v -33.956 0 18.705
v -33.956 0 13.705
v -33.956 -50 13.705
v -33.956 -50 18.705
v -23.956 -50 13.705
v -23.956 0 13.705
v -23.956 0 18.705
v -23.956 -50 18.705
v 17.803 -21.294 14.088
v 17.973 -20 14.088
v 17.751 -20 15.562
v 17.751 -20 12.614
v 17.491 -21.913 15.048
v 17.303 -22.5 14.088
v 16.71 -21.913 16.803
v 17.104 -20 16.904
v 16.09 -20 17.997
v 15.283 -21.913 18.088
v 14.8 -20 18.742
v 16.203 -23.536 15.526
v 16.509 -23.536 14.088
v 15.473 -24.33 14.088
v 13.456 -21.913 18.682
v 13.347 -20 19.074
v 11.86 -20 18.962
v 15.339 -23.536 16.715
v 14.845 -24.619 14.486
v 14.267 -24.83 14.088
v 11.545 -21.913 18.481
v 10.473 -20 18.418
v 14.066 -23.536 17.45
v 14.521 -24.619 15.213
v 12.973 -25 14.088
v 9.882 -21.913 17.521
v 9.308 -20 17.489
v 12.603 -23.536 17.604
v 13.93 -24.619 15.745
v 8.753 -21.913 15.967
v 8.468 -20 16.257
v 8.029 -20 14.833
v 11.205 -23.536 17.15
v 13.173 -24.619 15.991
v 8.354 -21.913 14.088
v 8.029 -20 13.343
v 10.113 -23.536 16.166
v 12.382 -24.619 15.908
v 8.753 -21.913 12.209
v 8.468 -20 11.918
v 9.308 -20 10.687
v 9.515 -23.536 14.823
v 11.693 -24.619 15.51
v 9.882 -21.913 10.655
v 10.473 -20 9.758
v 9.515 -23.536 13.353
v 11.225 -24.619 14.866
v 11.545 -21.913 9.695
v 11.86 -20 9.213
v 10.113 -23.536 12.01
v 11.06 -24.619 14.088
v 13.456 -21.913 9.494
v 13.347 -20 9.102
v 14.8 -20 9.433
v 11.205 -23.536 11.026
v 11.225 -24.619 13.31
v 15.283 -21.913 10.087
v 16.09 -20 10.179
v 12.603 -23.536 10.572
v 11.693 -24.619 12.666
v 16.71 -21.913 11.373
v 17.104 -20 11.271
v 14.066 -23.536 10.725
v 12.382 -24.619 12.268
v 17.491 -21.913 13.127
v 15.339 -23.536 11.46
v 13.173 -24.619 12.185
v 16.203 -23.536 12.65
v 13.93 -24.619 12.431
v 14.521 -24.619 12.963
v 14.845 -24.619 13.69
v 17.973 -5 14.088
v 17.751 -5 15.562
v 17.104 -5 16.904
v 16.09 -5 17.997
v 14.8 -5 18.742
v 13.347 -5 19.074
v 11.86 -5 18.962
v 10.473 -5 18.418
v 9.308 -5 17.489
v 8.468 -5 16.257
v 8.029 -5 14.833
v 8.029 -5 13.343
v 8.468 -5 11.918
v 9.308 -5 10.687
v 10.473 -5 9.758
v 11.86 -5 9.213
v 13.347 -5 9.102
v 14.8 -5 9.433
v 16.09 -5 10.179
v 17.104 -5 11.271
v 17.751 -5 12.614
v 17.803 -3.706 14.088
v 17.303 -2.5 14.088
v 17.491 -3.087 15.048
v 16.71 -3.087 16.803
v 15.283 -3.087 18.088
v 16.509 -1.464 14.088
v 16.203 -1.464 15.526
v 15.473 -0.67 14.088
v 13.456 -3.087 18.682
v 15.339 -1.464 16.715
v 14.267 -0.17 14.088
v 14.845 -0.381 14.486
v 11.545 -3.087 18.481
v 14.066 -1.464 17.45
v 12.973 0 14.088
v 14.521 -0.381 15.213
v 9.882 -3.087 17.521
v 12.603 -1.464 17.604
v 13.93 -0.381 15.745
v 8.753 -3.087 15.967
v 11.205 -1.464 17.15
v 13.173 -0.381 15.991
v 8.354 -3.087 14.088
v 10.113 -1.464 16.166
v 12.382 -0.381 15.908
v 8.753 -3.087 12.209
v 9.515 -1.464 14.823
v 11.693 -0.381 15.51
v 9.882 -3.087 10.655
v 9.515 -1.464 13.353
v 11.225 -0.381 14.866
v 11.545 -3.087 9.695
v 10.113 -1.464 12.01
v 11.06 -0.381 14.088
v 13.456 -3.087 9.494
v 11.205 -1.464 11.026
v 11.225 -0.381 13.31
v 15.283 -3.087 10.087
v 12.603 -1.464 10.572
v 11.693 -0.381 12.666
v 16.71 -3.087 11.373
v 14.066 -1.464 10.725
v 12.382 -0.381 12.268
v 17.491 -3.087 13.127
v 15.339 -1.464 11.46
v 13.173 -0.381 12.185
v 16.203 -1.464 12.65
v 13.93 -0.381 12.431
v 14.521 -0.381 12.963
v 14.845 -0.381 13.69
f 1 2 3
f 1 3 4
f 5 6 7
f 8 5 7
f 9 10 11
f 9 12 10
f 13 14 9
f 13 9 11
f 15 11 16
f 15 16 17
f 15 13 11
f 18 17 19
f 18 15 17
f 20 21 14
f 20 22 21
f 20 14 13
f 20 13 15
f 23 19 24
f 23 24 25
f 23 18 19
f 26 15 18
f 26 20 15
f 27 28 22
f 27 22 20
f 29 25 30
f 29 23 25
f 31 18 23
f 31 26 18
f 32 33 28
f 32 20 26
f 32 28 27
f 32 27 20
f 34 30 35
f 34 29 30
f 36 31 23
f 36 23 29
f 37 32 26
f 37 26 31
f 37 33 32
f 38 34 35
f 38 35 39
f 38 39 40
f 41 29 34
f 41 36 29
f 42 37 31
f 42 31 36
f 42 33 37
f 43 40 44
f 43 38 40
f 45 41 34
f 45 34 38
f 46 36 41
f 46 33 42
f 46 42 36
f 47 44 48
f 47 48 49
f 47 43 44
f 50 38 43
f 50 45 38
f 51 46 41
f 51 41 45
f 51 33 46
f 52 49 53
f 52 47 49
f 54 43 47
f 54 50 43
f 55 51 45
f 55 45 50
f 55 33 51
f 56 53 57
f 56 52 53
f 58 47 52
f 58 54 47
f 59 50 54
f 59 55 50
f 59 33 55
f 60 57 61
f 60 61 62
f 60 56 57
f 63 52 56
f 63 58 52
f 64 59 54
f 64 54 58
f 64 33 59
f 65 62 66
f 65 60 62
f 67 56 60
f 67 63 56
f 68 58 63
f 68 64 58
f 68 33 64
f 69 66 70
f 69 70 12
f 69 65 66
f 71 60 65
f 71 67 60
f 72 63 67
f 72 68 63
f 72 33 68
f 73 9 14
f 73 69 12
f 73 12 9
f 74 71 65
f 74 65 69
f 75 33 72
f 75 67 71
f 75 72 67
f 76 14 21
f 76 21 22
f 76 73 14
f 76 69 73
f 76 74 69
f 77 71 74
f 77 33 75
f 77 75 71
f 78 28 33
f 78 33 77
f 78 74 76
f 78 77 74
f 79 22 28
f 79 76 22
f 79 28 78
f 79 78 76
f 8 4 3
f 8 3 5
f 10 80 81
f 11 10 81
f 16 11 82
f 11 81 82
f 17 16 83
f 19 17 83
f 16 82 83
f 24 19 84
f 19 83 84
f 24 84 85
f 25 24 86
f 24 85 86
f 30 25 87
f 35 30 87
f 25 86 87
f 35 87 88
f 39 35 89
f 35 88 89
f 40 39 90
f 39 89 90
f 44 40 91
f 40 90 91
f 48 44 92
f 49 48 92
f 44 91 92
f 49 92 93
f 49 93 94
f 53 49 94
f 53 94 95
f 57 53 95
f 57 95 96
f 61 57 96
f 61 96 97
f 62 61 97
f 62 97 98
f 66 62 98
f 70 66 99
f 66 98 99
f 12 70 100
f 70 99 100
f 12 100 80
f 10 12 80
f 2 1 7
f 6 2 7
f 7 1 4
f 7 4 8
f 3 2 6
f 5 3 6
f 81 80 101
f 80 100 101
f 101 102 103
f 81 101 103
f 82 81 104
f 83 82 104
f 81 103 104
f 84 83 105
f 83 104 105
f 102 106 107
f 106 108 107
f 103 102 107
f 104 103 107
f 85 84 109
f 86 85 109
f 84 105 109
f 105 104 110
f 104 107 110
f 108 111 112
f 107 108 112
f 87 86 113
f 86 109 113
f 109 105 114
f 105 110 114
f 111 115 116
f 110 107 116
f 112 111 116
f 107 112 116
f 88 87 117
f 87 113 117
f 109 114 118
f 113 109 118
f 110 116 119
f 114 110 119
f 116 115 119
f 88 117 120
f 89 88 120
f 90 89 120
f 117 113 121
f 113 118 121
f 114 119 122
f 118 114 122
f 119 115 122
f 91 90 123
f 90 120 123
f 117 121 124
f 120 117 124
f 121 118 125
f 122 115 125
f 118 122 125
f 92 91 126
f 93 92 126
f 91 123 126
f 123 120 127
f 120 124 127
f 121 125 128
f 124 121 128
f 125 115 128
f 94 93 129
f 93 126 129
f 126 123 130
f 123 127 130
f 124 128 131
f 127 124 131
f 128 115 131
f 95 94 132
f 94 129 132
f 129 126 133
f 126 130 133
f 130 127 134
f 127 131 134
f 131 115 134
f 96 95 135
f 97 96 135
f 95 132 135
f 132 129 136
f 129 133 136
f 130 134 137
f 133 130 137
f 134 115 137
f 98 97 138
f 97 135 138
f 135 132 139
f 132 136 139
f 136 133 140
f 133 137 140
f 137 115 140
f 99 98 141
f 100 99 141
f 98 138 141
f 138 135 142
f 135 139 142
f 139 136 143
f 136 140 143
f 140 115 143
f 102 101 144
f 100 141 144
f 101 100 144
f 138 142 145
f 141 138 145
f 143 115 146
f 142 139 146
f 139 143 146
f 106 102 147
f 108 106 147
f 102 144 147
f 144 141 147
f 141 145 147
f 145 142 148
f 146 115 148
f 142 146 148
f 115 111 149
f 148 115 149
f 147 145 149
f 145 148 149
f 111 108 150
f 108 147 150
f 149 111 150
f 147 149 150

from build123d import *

# Parameters (mm, degrees)
F0_W     = 10
F0_H     = 5
F1_DEPTH = 50
F2_R     = 5
F3_DEPTH = 25
F4_R     = 5


with BuildPart() as f1:
    # F0 (on Front) → F1 (new body)
    with BuildSketch(Plane.XZ):
        with Locations((-28.956337, 16.204842)):
            Rectangle(F0_W, F0_H)
    extrude(amount=F1_DEPTH)


with BuildPart() as f3:
    # F2 (on Front) → F3 (new body)
    with BuildSketch(Plane.XZ):
        with Locations((12.972972, 14.087838)):
            Circle(F2_R)
    extrude(amount=F3_DEPTH)

    # F4
    f4_edges = [f3.edges().sort_by_distance(p)[0] for p in [
        (7.972972, -25, 14.087838),
        (7.972972, 0, 14.087838),
    ]]
    fillet(f4_edges, radius=F4_R)


solid = Compound([f1.part, f3.part])
